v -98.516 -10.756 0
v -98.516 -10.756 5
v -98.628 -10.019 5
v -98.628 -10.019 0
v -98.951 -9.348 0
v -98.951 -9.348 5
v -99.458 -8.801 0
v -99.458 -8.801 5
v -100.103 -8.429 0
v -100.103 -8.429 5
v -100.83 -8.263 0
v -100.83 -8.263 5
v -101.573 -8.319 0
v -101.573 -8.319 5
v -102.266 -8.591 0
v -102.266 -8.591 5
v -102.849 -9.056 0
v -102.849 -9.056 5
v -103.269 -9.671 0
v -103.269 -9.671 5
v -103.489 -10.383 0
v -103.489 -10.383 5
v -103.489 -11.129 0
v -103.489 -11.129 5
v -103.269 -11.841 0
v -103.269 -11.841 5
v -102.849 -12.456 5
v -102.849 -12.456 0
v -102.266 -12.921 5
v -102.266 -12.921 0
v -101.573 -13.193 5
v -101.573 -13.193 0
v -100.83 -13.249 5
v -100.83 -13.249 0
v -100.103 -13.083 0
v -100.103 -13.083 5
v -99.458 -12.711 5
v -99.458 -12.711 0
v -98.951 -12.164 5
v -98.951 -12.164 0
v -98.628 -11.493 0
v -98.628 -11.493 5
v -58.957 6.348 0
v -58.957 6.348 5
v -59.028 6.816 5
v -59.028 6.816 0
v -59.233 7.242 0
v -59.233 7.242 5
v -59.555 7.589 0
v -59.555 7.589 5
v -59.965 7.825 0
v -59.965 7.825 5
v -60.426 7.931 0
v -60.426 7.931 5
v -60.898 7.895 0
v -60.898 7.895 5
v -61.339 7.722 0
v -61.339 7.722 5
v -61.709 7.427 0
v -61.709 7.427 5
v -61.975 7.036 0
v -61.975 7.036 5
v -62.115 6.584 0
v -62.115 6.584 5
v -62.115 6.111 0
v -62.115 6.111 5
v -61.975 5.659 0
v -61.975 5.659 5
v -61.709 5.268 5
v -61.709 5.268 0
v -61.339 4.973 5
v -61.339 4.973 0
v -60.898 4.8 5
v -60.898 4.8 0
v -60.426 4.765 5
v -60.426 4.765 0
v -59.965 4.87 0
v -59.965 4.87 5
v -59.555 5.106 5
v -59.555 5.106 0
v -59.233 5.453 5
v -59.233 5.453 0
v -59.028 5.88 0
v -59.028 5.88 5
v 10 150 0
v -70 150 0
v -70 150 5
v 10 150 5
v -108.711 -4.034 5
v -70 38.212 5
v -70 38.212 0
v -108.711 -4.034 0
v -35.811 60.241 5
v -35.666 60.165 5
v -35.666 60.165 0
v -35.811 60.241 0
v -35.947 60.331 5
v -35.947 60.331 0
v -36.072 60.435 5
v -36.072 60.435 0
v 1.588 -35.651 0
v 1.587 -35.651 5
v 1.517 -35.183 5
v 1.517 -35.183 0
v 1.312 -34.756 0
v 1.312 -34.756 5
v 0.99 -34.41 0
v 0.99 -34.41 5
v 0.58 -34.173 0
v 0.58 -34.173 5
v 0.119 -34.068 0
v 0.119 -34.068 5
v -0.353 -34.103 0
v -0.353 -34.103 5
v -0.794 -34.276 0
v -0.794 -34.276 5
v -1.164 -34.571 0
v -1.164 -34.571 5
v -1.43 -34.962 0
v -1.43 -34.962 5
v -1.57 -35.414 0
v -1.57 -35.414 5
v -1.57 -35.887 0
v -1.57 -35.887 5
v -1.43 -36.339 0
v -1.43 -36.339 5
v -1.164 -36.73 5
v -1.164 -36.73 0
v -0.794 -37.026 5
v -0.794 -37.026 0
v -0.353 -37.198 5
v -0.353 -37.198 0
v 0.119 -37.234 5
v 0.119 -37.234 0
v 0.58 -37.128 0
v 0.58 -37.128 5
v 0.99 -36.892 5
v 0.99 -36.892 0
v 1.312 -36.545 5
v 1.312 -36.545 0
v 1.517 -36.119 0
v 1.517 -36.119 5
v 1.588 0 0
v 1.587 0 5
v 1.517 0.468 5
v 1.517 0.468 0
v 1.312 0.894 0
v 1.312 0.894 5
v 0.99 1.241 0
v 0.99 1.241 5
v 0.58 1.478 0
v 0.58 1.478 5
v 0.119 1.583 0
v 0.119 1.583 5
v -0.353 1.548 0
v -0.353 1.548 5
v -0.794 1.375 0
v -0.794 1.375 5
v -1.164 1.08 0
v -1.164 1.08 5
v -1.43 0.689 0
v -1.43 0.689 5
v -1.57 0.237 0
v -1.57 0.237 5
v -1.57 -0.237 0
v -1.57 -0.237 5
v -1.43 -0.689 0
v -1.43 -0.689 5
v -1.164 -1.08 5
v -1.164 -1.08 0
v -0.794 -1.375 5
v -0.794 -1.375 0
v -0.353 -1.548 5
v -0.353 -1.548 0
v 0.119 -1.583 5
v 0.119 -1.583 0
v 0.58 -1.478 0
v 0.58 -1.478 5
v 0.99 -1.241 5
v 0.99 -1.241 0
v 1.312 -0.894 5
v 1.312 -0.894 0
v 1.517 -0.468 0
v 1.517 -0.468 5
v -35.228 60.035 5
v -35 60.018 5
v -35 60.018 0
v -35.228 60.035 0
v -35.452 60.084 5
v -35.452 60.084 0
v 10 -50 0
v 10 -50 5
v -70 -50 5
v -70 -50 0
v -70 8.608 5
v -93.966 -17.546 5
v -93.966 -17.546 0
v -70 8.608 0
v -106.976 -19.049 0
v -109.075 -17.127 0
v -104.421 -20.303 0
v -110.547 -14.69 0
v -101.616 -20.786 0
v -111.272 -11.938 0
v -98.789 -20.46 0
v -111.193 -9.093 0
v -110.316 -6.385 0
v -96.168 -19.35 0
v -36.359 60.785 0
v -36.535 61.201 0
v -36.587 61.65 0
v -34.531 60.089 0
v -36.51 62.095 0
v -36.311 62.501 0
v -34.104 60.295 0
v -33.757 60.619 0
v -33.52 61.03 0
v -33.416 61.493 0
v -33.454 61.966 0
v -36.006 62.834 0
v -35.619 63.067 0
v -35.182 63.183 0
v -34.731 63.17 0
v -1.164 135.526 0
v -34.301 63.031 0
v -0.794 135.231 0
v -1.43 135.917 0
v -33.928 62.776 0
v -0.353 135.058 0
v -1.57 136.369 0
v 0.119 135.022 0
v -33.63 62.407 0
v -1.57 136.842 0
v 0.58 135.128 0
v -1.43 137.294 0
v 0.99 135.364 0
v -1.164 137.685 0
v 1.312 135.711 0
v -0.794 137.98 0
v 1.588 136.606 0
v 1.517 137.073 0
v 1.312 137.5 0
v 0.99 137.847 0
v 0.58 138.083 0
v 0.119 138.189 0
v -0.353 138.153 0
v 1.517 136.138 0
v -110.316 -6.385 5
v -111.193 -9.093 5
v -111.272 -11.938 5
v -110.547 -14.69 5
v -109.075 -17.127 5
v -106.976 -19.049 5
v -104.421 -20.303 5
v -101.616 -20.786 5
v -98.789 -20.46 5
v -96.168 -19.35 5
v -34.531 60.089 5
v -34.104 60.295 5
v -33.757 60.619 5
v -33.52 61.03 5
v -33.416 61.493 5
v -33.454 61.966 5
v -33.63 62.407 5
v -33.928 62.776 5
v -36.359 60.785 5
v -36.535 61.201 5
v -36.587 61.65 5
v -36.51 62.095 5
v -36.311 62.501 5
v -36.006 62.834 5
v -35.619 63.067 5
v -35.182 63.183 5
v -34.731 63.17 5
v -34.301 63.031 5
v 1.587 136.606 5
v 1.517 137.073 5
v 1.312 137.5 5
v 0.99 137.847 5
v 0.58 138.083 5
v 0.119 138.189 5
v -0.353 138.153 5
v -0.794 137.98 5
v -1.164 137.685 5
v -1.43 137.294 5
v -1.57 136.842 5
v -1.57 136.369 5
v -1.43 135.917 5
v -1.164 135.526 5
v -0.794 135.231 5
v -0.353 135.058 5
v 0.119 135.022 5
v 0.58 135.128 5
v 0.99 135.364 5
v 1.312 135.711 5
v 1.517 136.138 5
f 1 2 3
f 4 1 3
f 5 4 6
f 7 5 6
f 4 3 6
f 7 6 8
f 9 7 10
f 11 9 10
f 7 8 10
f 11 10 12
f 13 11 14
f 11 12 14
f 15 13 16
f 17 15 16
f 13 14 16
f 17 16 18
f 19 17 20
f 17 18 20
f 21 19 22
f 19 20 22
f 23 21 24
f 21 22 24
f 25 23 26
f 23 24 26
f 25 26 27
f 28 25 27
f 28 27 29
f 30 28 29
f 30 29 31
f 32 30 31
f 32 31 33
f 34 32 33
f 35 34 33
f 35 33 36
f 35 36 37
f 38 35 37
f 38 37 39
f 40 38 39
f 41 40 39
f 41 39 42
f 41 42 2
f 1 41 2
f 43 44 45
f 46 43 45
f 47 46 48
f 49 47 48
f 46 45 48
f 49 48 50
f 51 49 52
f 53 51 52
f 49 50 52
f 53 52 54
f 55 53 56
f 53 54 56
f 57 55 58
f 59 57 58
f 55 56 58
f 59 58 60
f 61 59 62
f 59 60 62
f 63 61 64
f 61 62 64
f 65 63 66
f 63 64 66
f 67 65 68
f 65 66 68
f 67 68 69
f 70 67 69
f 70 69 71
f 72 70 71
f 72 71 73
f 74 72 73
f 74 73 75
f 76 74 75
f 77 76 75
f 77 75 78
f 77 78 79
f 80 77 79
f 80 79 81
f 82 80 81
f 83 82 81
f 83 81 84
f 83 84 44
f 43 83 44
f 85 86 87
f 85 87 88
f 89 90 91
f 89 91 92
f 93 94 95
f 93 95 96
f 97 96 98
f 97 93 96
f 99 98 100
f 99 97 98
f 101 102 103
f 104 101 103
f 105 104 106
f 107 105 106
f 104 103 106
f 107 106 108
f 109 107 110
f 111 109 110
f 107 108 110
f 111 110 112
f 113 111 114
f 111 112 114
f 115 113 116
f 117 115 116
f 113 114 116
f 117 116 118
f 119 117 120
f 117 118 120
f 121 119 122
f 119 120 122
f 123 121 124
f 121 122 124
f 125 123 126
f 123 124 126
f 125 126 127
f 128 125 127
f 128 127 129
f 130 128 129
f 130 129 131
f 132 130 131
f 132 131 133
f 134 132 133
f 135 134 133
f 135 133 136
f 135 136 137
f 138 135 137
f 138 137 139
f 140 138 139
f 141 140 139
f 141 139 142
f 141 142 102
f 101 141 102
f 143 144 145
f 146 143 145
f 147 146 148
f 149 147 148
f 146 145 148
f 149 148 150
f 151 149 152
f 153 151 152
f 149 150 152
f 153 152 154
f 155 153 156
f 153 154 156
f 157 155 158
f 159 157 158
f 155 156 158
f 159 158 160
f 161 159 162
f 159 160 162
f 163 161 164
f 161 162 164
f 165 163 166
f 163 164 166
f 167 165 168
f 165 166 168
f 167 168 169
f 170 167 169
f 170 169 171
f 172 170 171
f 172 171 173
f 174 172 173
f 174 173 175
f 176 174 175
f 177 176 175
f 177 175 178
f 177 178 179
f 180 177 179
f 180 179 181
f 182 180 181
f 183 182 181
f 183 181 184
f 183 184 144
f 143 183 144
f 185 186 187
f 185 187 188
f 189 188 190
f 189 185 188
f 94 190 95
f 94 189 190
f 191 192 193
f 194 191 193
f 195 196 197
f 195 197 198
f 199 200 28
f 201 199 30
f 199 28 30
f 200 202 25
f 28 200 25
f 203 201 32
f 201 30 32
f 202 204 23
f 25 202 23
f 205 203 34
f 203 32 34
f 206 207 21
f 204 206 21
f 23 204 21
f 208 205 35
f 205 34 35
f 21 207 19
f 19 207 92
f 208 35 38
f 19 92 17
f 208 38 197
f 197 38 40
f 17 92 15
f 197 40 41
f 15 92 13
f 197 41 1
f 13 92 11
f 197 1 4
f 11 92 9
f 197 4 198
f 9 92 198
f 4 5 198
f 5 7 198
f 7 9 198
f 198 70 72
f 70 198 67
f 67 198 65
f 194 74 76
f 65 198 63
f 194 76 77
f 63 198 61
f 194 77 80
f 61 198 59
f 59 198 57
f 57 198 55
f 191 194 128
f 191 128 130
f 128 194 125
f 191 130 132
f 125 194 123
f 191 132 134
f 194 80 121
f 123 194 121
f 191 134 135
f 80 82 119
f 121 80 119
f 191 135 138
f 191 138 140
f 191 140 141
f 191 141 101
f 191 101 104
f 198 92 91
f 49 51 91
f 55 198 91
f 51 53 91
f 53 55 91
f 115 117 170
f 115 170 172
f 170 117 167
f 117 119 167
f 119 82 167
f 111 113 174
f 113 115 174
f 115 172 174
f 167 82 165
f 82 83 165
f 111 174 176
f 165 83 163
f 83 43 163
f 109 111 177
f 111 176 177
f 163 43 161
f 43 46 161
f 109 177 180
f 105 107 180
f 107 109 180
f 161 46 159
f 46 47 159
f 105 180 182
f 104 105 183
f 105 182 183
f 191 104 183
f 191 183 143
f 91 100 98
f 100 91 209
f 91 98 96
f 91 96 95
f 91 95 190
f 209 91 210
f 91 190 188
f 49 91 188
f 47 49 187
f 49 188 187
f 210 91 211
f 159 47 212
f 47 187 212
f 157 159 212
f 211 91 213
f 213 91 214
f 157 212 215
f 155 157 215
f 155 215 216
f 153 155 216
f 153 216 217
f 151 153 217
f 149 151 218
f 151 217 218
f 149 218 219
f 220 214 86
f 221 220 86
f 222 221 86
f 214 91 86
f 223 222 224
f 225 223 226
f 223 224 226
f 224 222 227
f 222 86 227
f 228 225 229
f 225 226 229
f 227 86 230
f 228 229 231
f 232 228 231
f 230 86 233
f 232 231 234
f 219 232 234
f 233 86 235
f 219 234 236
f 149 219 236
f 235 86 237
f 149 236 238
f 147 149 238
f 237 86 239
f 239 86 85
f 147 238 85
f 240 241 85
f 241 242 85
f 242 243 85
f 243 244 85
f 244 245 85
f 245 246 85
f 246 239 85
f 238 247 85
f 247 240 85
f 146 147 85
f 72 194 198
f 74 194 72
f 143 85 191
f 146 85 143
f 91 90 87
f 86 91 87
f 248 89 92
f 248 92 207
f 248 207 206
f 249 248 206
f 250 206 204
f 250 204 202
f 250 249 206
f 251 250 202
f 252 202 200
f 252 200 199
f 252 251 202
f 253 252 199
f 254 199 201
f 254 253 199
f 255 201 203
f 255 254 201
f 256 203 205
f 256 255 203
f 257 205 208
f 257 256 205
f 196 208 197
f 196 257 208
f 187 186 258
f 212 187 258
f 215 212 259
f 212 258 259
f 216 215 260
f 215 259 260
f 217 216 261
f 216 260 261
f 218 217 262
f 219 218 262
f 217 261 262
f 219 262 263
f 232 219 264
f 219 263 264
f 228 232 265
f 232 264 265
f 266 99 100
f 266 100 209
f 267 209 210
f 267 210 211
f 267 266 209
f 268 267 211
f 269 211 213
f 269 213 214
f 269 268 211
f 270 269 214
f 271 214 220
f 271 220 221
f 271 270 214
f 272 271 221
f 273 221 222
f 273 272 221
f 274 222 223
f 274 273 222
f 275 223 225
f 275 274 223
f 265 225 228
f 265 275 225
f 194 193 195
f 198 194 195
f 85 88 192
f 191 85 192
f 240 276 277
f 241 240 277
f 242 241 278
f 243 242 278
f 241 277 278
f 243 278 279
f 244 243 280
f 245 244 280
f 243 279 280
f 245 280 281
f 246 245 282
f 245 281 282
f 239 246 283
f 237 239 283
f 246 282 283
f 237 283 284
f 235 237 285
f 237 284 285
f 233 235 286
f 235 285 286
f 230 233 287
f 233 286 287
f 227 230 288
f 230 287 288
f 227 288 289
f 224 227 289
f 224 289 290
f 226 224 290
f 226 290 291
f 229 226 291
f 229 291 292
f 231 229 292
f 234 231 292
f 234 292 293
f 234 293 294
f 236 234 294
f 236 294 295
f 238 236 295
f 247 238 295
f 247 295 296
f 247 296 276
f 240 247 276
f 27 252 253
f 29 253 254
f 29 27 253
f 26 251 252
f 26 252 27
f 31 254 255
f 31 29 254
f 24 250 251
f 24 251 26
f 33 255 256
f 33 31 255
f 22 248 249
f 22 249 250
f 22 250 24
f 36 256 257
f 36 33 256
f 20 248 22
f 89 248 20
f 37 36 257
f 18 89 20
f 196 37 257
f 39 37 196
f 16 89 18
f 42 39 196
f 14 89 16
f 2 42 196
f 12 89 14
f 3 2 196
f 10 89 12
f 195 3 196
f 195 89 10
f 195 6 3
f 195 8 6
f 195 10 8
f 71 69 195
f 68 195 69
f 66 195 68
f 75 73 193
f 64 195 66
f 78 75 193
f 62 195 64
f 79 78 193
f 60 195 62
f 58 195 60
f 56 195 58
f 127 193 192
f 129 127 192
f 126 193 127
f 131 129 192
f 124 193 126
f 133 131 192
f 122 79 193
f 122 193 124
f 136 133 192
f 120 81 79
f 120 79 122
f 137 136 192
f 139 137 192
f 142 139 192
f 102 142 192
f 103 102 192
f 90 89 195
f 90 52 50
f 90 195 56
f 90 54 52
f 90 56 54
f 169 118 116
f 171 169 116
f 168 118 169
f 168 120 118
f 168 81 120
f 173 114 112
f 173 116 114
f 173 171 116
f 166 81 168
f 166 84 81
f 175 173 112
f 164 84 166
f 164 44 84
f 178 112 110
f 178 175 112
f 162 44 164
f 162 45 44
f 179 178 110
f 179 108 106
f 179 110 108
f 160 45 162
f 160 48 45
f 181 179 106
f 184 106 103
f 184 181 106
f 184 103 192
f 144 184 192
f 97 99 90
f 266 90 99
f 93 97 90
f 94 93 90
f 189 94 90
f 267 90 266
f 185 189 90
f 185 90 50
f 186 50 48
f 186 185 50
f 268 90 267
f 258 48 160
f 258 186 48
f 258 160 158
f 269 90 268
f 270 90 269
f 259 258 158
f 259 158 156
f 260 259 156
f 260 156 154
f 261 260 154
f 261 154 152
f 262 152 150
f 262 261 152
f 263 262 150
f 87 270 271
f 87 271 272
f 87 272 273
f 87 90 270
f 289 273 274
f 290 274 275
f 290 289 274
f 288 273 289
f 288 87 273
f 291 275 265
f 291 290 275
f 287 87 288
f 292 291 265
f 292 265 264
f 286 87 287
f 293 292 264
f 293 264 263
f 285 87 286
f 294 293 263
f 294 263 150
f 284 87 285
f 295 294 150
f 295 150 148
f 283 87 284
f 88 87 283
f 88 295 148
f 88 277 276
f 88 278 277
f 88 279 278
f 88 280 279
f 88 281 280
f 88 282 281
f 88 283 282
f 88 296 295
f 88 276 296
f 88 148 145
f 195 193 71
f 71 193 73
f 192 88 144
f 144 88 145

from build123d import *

# Parameters (mm, degrees)
F0_W     = 200
F0_H     = 300
F1_DEPTH = 5
F2_R     = 1.5875
F3_DEPTH = 5.001
F4_R     = 1.5875
F5_DEPTH = 25
F7_DEPTH = 5
F8_R     = 2.5
F9_DEPTH = 25


with BuildPart() as f1:
    # F0 (on Top) → F1 (new body)
    with BuildSketch(Plane.XY):
        Rectangle(F0_W, F0_H)
    extrude(amount=F1_DEPTH)

    # F2 (on face) → F3 (cut, through all)
    with BuildSketch(Plane.XY.offset(5)):
        Circle(F2_R)
        with Locations((0, -35.650707)):
            Circle(F2_R)
        with Locations((-60.544926, 6.347642)):
            Circle(F2_R)
        with Locations((-35, 61.605559)):
            Circle(F2_R)
        with Locations((0, 136.605559)):
            Circle(F2_R)
    extrude(amount=-F3_DEPTH, mode=Mode.SUBTRACT)

    # F4 (on face) → F5 (cut)
    with BuildSketch(Plane.XY.offset(5)):
        Polygon((-70, -50), (-70, 150), (-100, 150), (-100, -150), (100, -150), (100, 150), (10, 150), (10, -50), align=None)
        Circle(F4_R)
        with Locations((0, -35.650707)):
            Circle(F4_R)
        with Locations((-60.544926, 6.347642)):
            Circle(F4_R)
        with Locations((-35, 61.605559)):
            Circle(F4_R)
        with Locations((0, 136.605559)):
            Circle(F4_R)
    extrude(amount=-F5_DEPTH, mode=Mode.SUBTRACT)

    # F6 (on face) → F7 (join)
    with BuildSketch(Plane.XY.offset(5)):
        with BuildLine():
            ThreePointArc((-33.4125, 61.605559), (-33.877468, 60.483027), (-35, 60.018059))
            Line((-35, 60.018059), (-35, 46.803687))
            Line((-35, 46.803687), (0, 84.999484))
            Line((0, 84.999484), (0, 99.801357))
            Line((0, 99.801357), (-33.927501, 62.775987))
            ThreePointArc((-33.927501, 62.775987), (-33.546943, 62.244919), (-33.4125, 61.605559))
        make_face()
        with BuildLine():
            Line((-35, 46.803687), (-35, 60.018059))
            ThreePointArc((-35, 60.018059), (-35.341033, 60.055123), (-35.666142, 60.164583))
            Line((-35.666142, 60.164583), (-48.809552, 31.733206))
            Line((-48.809552, 31.733206), (-35, 46.803687))
        make_face()
        with BuildLine():
            ThreePointArc((-36.072499, 60.435131), (-36.170428, 62.678058), (-33.927501, 62.775987))
            Line((-33.927501, 62.775987), (0, 99.801357))
            Line((0, 99.801357), (0, 109.801357))
            ThreePointArc((0, 109.801357), (-4.027467, 108.954471), (-7.372773, 106.557259))
            Line((-7.372773, 106.557259), (-108.711305, -4.034342))
            ThreePointArc((-108.711305, -4.034342), (-108.094433, -18.163017), (-93.965758, -17.546146))
            Line((-93.965758, -17.546146), (-48.809552, 31.733206))
            Line((-48.809552, 31.733206), (-35.666142, 60.164583))
            ThreePointArc((-35.666142, 60.164583), (-35.879783, 60.284144), (-36.072499, 60.435131))
        make_face()
        with BuildLine():
            Line((0, 109.801357), (0, 99.801357))
            Line((0, 99.801357), (0, 84.999484))
            Line((0, 84.999484), (7.372773, 93.045455))
            ThreePointArc((7.372773, 93.045455), (9.153115, 103.828823), (0, 109.801357))
        make_face()
    extrude(amount=-F7_DEPTH)

    # F8 (on face) → F9 (cut)
    with BuildSketch(Plane.XY.offset(5)):
        with Locations((-101.016482, -10.755953)):
            Circle(F8_R)
    extrude(amount=-F9_DEPTH, mode=Mode.SUBTRACT)


solid = f1.part
